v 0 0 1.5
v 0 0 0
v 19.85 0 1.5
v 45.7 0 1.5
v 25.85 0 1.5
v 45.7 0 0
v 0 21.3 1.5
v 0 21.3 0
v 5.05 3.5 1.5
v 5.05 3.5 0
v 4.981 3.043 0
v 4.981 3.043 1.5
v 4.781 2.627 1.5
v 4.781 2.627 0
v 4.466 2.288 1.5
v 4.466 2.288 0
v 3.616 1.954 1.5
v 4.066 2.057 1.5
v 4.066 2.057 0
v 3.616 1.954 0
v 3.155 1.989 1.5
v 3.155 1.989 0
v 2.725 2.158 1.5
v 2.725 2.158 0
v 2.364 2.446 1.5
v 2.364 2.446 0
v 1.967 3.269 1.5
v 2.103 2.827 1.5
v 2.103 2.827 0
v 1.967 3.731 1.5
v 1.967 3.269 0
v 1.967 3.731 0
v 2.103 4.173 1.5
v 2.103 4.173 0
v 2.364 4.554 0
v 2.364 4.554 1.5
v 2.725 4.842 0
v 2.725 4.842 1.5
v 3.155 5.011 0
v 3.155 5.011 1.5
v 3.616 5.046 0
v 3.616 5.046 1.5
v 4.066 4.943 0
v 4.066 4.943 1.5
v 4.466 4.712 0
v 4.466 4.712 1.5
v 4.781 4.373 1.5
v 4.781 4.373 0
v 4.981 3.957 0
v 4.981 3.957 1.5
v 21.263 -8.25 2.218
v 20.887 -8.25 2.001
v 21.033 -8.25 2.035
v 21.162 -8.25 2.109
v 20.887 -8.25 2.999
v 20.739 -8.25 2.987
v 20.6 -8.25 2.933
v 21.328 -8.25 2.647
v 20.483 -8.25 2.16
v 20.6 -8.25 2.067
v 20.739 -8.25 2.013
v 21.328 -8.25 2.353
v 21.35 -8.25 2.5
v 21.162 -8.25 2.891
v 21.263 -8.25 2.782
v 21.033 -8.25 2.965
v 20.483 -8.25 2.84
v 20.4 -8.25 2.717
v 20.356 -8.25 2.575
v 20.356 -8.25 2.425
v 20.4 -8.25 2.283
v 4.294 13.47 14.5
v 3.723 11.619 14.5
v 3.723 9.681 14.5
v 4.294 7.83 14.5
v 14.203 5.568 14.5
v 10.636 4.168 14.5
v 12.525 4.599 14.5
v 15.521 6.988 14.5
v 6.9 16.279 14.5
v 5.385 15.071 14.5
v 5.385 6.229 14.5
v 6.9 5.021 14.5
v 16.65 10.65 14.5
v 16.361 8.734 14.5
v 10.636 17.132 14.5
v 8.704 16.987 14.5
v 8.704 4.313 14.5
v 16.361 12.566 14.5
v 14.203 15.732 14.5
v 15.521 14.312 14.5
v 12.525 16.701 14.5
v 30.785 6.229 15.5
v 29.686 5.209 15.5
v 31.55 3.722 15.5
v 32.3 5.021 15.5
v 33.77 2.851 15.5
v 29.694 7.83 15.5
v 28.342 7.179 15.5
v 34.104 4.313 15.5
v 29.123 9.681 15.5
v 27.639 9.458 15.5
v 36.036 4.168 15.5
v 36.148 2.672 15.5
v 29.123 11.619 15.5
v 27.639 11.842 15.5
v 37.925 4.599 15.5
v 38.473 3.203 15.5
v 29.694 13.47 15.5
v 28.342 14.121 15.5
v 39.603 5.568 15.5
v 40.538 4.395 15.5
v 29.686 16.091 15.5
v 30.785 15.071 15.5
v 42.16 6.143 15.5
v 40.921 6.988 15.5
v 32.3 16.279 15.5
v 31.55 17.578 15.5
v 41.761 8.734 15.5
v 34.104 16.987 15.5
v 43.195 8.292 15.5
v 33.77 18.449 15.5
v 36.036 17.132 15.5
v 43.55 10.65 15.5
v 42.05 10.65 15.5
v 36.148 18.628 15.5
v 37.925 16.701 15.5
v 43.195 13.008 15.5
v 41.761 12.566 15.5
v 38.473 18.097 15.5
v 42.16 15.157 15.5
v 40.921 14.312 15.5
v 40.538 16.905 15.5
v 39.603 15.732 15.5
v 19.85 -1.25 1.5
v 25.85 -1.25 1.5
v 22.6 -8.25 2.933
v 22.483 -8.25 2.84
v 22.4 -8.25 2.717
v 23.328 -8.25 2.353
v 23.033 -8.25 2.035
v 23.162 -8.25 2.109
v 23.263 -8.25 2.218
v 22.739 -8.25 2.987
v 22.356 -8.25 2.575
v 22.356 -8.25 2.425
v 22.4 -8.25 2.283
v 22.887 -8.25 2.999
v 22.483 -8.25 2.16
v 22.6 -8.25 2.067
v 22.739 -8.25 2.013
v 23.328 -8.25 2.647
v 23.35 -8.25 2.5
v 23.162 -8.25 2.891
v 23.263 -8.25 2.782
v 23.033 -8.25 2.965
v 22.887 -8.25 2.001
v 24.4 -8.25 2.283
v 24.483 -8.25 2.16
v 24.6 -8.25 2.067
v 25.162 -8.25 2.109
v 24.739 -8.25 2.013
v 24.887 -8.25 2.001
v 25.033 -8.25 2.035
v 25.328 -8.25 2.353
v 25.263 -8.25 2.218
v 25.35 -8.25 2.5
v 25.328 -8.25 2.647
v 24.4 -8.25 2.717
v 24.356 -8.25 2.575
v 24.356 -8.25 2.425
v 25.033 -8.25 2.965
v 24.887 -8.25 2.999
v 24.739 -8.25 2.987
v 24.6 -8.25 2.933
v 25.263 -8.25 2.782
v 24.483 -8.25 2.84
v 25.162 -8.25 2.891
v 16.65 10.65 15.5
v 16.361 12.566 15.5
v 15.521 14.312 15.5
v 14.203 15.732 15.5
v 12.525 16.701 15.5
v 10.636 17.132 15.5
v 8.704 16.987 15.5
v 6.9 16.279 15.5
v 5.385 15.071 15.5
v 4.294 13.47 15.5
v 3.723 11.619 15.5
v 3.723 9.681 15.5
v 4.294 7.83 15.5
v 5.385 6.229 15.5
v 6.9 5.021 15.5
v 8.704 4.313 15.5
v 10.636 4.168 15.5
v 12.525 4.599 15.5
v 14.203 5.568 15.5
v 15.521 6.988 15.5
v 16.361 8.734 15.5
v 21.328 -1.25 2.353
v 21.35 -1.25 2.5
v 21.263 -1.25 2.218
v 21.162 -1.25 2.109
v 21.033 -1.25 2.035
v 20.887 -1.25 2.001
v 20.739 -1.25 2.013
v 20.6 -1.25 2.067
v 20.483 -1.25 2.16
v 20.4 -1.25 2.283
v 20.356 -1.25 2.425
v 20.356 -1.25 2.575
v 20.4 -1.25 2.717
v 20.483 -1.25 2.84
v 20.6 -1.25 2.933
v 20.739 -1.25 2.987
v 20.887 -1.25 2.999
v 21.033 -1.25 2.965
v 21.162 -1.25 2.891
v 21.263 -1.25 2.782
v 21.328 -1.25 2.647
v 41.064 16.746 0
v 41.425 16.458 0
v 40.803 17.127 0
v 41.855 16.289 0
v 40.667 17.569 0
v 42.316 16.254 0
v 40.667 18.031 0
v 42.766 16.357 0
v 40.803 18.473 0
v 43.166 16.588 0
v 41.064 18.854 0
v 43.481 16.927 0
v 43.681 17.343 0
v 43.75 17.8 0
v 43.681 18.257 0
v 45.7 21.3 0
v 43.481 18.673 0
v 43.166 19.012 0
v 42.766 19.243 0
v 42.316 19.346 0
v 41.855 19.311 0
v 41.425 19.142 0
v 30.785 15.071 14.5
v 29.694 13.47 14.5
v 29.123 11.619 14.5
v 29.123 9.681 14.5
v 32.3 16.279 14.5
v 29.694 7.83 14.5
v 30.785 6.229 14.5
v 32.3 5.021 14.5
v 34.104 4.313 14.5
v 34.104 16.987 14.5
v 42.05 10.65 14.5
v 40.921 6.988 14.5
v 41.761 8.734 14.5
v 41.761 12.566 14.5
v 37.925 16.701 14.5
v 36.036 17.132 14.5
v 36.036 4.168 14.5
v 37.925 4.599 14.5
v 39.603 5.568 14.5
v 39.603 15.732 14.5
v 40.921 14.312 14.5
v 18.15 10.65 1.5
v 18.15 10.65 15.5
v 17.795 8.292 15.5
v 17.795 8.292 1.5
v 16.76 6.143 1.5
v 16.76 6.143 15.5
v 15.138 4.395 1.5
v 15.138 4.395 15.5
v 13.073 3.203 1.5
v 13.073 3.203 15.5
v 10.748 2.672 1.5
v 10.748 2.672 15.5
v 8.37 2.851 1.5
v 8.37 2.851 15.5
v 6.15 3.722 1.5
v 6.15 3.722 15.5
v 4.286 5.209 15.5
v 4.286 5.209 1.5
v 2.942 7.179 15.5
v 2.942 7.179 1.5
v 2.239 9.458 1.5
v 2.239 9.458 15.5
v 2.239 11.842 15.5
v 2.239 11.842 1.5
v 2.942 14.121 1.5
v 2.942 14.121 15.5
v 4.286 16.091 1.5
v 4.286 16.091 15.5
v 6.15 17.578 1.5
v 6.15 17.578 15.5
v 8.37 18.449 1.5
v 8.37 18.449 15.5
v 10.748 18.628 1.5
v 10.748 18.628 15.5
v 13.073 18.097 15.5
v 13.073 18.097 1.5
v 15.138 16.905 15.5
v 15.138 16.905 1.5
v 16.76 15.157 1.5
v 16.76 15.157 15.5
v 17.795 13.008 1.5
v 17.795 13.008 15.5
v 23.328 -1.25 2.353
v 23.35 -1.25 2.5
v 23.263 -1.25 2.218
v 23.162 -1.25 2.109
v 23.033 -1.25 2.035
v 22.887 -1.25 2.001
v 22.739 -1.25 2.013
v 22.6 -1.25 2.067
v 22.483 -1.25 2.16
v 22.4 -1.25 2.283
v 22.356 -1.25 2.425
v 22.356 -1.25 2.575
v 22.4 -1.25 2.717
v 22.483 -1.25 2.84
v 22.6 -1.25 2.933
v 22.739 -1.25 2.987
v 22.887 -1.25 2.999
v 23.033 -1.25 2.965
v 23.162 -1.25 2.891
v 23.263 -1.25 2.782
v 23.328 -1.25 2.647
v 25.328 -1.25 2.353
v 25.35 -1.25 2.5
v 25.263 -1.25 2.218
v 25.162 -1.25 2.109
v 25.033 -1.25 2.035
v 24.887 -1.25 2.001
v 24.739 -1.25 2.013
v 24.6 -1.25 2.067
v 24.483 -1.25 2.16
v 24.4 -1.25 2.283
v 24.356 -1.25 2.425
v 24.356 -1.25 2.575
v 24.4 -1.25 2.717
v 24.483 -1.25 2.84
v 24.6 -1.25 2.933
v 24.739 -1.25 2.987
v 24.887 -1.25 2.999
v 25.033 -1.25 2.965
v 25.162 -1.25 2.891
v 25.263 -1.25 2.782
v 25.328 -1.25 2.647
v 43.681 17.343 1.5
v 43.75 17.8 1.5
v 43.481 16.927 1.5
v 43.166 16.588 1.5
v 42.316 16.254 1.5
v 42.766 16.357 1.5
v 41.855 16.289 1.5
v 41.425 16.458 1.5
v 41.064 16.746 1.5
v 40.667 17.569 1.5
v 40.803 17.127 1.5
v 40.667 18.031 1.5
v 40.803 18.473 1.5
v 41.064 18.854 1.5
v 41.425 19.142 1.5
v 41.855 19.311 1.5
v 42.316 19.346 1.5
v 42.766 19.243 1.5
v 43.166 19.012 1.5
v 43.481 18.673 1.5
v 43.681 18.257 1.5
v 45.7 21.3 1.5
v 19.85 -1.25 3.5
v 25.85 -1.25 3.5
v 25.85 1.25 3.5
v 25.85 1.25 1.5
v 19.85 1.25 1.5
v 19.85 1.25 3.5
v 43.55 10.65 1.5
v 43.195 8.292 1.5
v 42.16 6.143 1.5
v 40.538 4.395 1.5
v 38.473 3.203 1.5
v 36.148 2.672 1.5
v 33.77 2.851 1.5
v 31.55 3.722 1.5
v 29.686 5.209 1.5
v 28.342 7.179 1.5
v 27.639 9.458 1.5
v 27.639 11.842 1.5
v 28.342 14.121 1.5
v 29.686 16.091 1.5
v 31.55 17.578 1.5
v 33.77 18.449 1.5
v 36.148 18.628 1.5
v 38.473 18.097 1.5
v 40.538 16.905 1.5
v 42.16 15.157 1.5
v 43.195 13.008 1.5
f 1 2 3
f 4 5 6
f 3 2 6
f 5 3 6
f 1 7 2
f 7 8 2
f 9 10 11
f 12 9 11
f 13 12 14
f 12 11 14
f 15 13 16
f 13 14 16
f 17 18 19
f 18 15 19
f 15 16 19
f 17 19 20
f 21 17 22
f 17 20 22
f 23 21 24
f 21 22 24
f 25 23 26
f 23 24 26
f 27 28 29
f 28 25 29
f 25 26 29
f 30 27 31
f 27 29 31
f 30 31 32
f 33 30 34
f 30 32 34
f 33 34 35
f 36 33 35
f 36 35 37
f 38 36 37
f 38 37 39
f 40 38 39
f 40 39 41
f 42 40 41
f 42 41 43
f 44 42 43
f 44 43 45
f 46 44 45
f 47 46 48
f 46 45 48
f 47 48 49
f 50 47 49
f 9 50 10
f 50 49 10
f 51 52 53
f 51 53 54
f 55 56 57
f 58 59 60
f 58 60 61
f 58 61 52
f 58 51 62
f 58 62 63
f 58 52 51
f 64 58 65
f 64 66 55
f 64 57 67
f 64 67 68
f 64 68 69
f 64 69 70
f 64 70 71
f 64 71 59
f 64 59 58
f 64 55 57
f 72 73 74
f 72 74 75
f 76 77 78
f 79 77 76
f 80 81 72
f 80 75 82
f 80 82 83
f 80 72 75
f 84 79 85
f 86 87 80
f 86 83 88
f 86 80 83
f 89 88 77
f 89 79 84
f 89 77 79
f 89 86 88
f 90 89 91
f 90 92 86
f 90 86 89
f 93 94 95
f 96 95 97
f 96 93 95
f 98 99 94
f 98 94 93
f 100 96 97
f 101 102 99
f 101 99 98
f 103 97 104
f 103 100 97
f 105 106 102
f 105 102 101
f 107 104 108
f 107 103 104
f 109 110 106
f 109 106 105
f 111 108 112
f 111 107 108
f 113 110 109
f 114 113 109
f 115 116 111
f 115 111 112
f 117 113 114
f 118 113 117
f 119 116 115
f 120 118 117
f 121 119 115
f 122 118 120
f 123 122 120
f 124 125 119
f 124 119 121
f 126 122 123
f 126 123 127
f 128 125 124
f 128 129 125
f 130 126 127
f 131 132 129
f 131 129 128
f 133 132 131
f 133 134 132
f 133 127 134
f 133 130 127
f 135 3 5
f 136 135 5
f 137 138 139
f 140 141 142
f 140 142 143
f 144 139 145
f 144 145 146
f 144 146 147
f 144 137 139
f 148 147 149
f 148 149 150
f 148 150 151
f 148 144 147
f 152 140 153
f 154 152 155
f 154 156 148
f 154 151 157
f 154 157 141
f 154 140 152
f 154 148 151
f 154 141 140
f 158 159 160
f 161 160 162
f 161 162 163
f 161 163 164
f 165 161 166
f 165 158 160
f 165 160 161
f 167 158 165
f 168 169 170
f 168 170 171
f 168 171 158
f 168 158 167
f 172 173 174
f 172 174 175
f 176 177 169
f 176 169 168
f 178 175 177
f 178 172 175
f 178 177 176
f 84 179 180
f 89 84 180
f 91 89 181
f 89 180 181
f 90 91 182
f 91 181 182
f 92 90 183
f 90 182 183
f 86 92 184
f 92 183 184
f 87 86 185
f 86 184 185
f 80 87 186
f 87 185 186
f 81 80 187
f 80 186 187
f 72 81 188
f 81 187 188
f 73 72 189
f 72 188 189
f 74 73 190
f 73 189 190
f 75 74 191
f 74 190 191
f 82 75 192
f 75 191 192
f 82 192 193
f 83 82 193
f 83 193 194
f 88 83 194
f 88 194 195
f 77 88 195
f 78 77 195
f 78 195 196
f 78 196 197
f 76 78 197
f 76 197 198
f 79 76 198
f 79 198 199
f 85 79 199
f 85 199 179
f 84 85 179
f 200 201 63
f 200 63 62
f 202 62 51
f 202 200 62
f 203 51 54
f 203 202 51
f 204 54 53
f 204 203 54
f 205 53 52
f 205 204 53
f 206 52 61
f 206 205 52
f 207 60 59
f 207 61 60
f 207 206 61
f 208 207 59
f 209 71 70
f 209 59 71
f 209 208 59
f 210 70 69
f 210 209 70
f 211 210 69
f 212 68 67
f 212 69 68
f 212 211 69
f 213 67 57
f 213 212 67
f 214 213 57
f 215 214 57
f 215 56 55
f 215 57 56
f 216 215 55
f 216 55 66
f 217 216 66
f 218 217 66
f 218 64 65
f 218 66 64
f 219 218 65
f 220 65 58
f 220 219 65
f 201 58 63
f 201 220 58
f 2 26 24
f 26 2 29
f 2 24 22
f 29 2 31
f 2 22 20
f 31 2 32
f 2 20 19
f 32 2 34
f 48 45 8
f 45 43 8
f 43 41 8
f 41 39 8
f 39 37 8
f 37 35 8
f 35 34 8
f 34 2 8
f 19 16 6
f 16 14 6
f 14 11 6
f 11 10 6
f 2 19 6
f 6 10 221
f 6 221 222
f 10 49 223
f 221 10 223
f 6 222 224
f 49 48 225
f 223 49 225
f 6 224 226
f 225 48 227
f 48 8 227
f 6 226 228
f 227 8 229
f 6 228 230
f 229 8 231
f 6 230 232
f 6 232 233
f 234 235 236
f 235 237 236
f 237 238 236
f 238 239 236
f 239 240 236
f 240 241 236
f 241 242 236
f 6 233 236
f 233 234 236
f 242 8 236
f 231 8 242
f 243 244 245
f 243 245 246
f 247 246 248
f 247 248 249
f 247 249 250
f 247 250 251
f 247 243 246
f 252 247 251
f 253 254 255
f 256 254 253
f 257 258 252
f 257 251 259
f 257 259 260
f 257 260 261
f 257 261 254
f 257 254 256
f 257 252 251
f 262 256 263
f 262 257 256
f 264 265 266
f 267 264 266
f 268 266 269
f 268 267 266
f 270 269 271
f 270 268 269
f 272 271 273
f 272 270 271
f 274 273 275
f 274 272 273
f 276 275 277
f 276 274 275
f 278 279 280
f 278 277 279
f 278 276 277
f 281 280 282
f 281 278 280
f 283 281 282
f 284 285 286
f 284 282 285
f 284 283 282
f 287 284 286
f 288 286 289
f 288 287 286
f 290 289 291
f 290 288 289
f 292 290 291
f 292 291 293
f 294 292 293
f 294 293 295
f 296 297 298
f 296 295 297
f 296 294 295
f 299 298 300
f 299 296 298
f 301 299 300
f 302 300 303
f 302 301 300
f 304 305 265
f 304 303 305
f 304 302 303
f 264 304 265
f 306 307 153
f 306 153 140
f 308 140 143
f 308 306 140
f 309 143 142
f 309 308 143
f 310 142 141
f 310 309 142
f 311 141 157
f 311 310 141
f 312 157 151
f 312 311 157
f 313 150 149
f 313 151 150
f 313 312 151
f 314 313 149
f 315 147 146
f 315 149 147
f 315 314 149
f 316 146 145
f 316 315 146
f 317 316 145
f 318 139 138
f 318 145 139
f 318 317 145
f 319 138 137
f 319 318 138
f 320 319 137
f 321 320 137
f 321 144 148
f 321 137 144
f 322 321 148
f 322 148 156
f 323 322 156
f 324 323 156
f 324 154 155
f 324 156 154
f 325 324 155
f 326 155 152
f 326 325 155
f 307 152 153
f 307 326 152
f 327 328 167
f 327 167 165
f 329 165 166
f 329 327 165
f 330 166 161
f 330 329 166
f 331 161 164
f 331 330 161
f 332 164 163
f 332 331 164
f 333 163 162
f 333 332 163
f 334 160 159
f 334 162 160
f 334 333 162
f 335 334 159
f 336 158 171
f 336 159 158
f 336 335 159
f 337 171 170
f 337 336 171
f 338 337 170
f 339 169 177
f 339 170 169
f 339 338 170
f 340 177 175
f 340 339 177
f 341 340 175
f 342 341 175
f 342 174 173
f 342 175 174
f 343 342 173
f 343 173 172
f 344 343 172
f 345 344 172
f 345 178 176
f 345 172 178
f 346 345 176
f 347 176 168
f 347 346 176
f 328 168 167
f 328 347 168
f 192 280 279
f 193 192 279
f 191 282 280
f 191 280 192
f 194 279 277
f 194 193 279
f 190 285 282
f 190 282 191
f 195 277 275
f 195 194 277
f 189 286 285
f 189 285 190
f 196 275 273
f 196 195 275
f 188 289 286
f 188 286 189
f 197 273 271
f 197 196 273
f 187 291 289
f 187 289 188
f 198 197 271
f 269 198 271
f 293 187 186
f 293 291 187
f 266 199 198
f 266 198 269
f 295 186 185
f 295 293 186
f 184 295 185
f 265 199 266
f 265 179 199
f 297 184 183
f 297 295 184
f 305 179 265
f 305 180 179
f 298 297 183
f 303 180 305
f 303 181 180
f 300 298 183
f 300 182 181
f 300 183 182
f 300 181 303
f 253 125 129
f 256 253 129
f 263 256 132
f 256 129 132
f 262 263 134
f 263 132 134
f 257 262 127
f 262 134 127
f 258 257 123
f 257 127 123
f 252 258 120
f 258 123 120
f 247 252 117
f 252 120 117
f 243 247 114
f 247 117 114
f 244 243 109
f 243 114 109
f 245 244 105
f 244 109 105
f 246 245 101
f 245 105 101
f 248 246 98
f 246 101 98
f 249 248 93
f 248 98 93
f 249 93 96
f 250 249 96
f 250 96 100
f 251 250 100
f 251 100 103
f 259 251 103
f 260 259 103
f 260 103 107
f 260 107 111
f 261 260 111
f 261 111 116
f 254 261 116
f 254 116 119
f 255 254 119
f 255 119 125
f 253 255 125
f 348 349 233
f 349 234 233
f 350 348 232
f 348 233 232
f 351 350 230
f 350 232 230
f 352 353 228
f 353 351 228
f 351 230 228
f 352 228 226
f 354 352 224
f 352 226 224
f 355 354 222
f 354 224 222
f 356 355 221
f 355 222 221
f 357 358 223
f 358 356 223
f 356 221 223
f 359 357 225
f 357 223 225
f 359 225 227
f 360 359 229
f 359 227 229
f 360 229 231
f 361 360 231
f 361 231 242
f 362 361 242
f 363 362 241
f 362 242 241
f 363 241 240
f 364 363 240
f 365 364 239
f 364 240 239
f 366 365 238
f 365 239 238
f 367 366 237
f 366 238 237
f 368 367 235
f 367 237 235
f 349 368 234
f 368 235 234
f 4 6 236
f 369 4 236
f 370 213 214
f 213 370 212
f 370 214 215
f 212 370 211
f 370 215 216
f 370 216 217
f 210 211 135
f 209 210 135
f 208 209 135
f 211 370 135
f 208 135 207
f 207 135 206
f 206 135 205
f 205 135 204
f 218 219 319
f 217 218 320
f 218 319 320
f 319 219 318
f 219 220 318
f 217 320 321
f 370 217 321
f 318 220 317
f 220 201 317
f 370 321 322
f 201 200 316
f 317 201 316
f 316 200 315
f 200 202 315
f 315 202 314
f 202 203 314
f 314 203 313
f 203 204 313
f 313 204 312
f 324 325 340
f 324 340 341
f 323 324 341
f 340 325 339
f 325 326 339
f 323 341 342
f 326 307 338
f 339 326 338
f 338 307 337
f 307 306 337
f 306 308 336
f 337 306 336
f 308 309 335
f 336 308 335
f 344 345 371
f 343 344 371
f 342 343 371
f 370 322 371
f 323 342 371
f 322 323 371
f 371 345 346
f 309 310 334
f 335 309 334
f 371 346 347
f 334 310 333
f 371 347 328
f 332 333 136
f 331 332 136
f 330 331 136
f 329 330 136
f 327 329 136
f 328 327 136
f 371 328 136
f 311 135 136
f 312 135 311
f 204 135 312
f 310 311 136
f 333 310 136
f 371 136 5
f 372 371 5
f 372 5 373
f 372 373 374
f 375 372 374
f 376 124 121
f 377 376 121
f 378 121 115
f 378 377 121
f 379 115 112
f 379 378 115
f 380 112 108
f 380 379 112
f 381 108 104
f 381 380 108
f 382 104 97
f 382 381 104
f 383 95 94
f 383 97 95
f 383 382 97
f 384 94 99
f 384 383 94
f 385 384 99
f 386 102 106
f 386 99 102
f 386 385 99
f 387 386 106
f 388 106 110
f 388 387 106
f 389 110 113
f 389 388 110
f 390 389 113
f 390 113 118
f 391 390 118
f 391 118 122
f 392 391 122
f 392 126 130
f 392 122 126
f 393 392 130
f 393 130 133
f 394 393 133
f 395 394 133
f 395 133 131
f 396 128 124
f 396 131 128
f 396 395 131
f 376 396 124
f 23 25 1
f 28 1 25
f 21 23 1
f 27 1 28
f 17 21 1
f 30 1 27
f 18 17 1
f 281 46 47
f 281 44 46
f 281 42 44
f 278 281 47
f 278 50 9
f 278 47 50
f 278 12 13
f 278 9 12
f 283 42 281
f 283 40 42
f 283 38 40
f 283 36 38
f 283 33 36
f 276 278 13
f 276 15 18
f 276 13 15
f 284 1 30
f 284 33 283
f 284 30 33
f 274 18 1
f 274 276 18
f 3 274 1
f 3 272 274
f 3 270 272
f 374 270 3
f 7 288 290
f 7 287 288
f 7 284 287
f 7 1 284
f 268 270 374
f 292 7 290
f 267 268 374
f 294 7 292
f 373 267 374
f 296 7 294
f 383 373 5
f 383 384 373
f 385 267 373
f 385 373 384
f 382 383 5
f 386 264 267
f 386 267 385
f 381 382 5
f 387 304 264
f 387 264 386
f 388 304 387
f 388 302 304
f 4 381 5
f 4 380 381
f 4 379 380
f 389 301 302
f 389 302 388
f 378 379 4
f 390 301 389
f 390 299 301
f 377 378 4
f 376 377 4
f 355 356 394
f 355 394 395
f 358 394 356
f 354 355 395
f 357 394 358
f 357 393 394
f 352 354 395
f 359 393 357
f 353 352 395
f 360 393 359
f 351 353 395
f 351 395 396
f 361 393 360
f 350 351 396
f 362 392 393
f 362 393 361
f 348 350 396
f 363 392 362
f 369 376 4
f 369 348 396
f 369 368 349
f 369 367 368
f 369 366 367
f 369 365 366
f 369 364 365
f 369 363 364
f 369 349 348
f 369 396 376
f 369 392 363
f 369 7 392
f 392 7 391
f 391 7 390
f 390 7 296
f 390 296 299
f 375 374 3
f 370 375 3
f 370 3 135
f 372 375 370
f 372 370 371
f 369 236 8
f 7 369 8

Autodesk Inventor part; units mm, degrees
ref_plane "YZ Plane" through (0, 0, 0) normal (1, 0, 0) x (0, 1, 0)
ref_plane "XZ Plane" through (0, 0, 0) normal (0, 1, 0) x (-1, 0, 0)
ref_plane "XY Plane" through (0, 0, 0) normal (0, 0, 1) x (1, 0, 0)
sketch "スケッチ1" plane through (0, 0, 0) normal (0, 0, 1) x (1, 0, 0)
  line L0 (0, 0) -> (45.7, 0)
  line L1 (45.7, 0) -> (45.7, 21.3)
  line L2 (45.7, 21.3) -> (0, 21.3)
  line L3 (0, 21.3) -> (0, 0)
  line L4 (45.7, 21.3) -> (42.2, 21.3) construction
  line L5 (42.2, 21.3) -> (42.2, 17.8) construction
  line L6 (42.2, 17.8) -> (45.7, 17.8) construction
  line L7 (45.7, 17.8) -> (45.7, 21.3) construction
  line L8 (0, 0) -> (3.5, 0) construction
  line L9 (3.5, 0) -> (3.5, 3.5) construction
  line L10 (3.5, 3.5) -> (0, 3.5) construction
  line L11 (0, 3.5) -> (0, 0) construction
  circle A0 centre (3.5, 3.5) radius 1.55
  circle A1 centre (42.2, 17.8) radius 1.55
  dimension "d0" = 45.7
  dimension "d1" = 21.3
  dimension "d2" = 3.5
  dimension "d3" = 3.5
  dimension "d4" = 3.5
  dimension "d5" = 3.5
  dimension "d6" = 3.1
  dimension "d7" = 3.1
extrude "押し出し1" add sketch "スケッチ1" along normal blind 1.5
sketch "スケッチ2" plane through (0, 0, 1.5) normal (0, 0, 1) x (1, 0, 0)
  line L0 (0, 21.3) -> (0, 0) construction
  line L1 (0, 10.65) -> (2, 10.65) construction
  line L2 (2, 10.65) -> (18.3, 10.65) construction
  line L3 (18.3, 10.65) -> (27.4, 10.65) construction
  line L4 (27.4, 10.65) -> (43.7, 10.65) construction
  line L5 (43.7, 10.65) -> (45.7, 10.65) construction
  circle A0 centre (10.15, 10.65) radius 8
  circle A1 centre (35.55, 10.65) radius 8
  dimension "d10" = 2
  dimension "d11" = 16.3
  dimension "d12" = 9.1
  dimension "d13" = 16.3
  dimension "d14" = 2
  dimension "d15" = 16
  dimension "d16" = 16
extrude "押し出し2" add sketch "スケッチ2" along normal blind 14
sketch "スケッチ3" plane through (10.15, 10.65, 15.5) normal (0, 0, 1) x (1, 0, 0)
  circle A0 centre (0, 0) radius 6.5
  circle A1 centre (25.4, 0) radius 8 projected
  circle A2 centre (25.4, 0) radius 6.5
  point P0 (-10.15, -10.65)
  dimension "d19" = 13
  dimension "d20" = 13
extrude "押し出し3" cut sketch "スケッチ3" against normal blind 1 contours A0 | A2
sketch "スケッチ4" plane through (0, 0, 1.5) normal (0, 0, 1) x (1, 0, 0)
  line L0 (19.85, -1.25) -> (25.85, -1.25)
  line L1 (25.85, -1.25) -> (25.85, 1.25)
  line L2 (25.85, 1.25) -> (19.85, 1.25)
  line L3 (19.85, 1.25) -> (19.85, -1.25)
  line L4 (0, 0) -> (45.7, 0) projected
  line L5 (19.85, -1.25) -> (25.85, 1.25) construction
  line L6 (25.85, -1.25) -> (19.85, 1.25) construction
  point P0 (22.85, 0)
  dimension "d23" = 6
  dimension "d24" = 2.5
extrude "押し出し4" add sketch "スケッチ4" along normal blind 2
sketch "スケッチ5" plane through (19.85, -1.25, 1.5) normal (0, -1, 0) x (1, 0, 0)
  circle A0 centre (3, 1) radius 0.5
  line L0 (0, 0) -> (0, 2) construction
  line L1 (0, 1) -> (1, 1) construction
  line L2 (6, 0) -> (6, 2) construction
  line L3 (6, 1) -> (5, 1) construction
  circle A1 centre (1, 1) radius 0.5
  circle A2 centre (5, 1) radius 0.5
  point P0 (-19.85, -1.5)
  dimension "d27" = 1
  dimension "d28" = 1
  dimension "d29" = 1
  dimension "d30" = 1
  dimension "d31" = 1
extrude "押し出し5" add sketch "スケッチ5" along normal blind 7
properties part number "UltrasonicDistanceSencor"
